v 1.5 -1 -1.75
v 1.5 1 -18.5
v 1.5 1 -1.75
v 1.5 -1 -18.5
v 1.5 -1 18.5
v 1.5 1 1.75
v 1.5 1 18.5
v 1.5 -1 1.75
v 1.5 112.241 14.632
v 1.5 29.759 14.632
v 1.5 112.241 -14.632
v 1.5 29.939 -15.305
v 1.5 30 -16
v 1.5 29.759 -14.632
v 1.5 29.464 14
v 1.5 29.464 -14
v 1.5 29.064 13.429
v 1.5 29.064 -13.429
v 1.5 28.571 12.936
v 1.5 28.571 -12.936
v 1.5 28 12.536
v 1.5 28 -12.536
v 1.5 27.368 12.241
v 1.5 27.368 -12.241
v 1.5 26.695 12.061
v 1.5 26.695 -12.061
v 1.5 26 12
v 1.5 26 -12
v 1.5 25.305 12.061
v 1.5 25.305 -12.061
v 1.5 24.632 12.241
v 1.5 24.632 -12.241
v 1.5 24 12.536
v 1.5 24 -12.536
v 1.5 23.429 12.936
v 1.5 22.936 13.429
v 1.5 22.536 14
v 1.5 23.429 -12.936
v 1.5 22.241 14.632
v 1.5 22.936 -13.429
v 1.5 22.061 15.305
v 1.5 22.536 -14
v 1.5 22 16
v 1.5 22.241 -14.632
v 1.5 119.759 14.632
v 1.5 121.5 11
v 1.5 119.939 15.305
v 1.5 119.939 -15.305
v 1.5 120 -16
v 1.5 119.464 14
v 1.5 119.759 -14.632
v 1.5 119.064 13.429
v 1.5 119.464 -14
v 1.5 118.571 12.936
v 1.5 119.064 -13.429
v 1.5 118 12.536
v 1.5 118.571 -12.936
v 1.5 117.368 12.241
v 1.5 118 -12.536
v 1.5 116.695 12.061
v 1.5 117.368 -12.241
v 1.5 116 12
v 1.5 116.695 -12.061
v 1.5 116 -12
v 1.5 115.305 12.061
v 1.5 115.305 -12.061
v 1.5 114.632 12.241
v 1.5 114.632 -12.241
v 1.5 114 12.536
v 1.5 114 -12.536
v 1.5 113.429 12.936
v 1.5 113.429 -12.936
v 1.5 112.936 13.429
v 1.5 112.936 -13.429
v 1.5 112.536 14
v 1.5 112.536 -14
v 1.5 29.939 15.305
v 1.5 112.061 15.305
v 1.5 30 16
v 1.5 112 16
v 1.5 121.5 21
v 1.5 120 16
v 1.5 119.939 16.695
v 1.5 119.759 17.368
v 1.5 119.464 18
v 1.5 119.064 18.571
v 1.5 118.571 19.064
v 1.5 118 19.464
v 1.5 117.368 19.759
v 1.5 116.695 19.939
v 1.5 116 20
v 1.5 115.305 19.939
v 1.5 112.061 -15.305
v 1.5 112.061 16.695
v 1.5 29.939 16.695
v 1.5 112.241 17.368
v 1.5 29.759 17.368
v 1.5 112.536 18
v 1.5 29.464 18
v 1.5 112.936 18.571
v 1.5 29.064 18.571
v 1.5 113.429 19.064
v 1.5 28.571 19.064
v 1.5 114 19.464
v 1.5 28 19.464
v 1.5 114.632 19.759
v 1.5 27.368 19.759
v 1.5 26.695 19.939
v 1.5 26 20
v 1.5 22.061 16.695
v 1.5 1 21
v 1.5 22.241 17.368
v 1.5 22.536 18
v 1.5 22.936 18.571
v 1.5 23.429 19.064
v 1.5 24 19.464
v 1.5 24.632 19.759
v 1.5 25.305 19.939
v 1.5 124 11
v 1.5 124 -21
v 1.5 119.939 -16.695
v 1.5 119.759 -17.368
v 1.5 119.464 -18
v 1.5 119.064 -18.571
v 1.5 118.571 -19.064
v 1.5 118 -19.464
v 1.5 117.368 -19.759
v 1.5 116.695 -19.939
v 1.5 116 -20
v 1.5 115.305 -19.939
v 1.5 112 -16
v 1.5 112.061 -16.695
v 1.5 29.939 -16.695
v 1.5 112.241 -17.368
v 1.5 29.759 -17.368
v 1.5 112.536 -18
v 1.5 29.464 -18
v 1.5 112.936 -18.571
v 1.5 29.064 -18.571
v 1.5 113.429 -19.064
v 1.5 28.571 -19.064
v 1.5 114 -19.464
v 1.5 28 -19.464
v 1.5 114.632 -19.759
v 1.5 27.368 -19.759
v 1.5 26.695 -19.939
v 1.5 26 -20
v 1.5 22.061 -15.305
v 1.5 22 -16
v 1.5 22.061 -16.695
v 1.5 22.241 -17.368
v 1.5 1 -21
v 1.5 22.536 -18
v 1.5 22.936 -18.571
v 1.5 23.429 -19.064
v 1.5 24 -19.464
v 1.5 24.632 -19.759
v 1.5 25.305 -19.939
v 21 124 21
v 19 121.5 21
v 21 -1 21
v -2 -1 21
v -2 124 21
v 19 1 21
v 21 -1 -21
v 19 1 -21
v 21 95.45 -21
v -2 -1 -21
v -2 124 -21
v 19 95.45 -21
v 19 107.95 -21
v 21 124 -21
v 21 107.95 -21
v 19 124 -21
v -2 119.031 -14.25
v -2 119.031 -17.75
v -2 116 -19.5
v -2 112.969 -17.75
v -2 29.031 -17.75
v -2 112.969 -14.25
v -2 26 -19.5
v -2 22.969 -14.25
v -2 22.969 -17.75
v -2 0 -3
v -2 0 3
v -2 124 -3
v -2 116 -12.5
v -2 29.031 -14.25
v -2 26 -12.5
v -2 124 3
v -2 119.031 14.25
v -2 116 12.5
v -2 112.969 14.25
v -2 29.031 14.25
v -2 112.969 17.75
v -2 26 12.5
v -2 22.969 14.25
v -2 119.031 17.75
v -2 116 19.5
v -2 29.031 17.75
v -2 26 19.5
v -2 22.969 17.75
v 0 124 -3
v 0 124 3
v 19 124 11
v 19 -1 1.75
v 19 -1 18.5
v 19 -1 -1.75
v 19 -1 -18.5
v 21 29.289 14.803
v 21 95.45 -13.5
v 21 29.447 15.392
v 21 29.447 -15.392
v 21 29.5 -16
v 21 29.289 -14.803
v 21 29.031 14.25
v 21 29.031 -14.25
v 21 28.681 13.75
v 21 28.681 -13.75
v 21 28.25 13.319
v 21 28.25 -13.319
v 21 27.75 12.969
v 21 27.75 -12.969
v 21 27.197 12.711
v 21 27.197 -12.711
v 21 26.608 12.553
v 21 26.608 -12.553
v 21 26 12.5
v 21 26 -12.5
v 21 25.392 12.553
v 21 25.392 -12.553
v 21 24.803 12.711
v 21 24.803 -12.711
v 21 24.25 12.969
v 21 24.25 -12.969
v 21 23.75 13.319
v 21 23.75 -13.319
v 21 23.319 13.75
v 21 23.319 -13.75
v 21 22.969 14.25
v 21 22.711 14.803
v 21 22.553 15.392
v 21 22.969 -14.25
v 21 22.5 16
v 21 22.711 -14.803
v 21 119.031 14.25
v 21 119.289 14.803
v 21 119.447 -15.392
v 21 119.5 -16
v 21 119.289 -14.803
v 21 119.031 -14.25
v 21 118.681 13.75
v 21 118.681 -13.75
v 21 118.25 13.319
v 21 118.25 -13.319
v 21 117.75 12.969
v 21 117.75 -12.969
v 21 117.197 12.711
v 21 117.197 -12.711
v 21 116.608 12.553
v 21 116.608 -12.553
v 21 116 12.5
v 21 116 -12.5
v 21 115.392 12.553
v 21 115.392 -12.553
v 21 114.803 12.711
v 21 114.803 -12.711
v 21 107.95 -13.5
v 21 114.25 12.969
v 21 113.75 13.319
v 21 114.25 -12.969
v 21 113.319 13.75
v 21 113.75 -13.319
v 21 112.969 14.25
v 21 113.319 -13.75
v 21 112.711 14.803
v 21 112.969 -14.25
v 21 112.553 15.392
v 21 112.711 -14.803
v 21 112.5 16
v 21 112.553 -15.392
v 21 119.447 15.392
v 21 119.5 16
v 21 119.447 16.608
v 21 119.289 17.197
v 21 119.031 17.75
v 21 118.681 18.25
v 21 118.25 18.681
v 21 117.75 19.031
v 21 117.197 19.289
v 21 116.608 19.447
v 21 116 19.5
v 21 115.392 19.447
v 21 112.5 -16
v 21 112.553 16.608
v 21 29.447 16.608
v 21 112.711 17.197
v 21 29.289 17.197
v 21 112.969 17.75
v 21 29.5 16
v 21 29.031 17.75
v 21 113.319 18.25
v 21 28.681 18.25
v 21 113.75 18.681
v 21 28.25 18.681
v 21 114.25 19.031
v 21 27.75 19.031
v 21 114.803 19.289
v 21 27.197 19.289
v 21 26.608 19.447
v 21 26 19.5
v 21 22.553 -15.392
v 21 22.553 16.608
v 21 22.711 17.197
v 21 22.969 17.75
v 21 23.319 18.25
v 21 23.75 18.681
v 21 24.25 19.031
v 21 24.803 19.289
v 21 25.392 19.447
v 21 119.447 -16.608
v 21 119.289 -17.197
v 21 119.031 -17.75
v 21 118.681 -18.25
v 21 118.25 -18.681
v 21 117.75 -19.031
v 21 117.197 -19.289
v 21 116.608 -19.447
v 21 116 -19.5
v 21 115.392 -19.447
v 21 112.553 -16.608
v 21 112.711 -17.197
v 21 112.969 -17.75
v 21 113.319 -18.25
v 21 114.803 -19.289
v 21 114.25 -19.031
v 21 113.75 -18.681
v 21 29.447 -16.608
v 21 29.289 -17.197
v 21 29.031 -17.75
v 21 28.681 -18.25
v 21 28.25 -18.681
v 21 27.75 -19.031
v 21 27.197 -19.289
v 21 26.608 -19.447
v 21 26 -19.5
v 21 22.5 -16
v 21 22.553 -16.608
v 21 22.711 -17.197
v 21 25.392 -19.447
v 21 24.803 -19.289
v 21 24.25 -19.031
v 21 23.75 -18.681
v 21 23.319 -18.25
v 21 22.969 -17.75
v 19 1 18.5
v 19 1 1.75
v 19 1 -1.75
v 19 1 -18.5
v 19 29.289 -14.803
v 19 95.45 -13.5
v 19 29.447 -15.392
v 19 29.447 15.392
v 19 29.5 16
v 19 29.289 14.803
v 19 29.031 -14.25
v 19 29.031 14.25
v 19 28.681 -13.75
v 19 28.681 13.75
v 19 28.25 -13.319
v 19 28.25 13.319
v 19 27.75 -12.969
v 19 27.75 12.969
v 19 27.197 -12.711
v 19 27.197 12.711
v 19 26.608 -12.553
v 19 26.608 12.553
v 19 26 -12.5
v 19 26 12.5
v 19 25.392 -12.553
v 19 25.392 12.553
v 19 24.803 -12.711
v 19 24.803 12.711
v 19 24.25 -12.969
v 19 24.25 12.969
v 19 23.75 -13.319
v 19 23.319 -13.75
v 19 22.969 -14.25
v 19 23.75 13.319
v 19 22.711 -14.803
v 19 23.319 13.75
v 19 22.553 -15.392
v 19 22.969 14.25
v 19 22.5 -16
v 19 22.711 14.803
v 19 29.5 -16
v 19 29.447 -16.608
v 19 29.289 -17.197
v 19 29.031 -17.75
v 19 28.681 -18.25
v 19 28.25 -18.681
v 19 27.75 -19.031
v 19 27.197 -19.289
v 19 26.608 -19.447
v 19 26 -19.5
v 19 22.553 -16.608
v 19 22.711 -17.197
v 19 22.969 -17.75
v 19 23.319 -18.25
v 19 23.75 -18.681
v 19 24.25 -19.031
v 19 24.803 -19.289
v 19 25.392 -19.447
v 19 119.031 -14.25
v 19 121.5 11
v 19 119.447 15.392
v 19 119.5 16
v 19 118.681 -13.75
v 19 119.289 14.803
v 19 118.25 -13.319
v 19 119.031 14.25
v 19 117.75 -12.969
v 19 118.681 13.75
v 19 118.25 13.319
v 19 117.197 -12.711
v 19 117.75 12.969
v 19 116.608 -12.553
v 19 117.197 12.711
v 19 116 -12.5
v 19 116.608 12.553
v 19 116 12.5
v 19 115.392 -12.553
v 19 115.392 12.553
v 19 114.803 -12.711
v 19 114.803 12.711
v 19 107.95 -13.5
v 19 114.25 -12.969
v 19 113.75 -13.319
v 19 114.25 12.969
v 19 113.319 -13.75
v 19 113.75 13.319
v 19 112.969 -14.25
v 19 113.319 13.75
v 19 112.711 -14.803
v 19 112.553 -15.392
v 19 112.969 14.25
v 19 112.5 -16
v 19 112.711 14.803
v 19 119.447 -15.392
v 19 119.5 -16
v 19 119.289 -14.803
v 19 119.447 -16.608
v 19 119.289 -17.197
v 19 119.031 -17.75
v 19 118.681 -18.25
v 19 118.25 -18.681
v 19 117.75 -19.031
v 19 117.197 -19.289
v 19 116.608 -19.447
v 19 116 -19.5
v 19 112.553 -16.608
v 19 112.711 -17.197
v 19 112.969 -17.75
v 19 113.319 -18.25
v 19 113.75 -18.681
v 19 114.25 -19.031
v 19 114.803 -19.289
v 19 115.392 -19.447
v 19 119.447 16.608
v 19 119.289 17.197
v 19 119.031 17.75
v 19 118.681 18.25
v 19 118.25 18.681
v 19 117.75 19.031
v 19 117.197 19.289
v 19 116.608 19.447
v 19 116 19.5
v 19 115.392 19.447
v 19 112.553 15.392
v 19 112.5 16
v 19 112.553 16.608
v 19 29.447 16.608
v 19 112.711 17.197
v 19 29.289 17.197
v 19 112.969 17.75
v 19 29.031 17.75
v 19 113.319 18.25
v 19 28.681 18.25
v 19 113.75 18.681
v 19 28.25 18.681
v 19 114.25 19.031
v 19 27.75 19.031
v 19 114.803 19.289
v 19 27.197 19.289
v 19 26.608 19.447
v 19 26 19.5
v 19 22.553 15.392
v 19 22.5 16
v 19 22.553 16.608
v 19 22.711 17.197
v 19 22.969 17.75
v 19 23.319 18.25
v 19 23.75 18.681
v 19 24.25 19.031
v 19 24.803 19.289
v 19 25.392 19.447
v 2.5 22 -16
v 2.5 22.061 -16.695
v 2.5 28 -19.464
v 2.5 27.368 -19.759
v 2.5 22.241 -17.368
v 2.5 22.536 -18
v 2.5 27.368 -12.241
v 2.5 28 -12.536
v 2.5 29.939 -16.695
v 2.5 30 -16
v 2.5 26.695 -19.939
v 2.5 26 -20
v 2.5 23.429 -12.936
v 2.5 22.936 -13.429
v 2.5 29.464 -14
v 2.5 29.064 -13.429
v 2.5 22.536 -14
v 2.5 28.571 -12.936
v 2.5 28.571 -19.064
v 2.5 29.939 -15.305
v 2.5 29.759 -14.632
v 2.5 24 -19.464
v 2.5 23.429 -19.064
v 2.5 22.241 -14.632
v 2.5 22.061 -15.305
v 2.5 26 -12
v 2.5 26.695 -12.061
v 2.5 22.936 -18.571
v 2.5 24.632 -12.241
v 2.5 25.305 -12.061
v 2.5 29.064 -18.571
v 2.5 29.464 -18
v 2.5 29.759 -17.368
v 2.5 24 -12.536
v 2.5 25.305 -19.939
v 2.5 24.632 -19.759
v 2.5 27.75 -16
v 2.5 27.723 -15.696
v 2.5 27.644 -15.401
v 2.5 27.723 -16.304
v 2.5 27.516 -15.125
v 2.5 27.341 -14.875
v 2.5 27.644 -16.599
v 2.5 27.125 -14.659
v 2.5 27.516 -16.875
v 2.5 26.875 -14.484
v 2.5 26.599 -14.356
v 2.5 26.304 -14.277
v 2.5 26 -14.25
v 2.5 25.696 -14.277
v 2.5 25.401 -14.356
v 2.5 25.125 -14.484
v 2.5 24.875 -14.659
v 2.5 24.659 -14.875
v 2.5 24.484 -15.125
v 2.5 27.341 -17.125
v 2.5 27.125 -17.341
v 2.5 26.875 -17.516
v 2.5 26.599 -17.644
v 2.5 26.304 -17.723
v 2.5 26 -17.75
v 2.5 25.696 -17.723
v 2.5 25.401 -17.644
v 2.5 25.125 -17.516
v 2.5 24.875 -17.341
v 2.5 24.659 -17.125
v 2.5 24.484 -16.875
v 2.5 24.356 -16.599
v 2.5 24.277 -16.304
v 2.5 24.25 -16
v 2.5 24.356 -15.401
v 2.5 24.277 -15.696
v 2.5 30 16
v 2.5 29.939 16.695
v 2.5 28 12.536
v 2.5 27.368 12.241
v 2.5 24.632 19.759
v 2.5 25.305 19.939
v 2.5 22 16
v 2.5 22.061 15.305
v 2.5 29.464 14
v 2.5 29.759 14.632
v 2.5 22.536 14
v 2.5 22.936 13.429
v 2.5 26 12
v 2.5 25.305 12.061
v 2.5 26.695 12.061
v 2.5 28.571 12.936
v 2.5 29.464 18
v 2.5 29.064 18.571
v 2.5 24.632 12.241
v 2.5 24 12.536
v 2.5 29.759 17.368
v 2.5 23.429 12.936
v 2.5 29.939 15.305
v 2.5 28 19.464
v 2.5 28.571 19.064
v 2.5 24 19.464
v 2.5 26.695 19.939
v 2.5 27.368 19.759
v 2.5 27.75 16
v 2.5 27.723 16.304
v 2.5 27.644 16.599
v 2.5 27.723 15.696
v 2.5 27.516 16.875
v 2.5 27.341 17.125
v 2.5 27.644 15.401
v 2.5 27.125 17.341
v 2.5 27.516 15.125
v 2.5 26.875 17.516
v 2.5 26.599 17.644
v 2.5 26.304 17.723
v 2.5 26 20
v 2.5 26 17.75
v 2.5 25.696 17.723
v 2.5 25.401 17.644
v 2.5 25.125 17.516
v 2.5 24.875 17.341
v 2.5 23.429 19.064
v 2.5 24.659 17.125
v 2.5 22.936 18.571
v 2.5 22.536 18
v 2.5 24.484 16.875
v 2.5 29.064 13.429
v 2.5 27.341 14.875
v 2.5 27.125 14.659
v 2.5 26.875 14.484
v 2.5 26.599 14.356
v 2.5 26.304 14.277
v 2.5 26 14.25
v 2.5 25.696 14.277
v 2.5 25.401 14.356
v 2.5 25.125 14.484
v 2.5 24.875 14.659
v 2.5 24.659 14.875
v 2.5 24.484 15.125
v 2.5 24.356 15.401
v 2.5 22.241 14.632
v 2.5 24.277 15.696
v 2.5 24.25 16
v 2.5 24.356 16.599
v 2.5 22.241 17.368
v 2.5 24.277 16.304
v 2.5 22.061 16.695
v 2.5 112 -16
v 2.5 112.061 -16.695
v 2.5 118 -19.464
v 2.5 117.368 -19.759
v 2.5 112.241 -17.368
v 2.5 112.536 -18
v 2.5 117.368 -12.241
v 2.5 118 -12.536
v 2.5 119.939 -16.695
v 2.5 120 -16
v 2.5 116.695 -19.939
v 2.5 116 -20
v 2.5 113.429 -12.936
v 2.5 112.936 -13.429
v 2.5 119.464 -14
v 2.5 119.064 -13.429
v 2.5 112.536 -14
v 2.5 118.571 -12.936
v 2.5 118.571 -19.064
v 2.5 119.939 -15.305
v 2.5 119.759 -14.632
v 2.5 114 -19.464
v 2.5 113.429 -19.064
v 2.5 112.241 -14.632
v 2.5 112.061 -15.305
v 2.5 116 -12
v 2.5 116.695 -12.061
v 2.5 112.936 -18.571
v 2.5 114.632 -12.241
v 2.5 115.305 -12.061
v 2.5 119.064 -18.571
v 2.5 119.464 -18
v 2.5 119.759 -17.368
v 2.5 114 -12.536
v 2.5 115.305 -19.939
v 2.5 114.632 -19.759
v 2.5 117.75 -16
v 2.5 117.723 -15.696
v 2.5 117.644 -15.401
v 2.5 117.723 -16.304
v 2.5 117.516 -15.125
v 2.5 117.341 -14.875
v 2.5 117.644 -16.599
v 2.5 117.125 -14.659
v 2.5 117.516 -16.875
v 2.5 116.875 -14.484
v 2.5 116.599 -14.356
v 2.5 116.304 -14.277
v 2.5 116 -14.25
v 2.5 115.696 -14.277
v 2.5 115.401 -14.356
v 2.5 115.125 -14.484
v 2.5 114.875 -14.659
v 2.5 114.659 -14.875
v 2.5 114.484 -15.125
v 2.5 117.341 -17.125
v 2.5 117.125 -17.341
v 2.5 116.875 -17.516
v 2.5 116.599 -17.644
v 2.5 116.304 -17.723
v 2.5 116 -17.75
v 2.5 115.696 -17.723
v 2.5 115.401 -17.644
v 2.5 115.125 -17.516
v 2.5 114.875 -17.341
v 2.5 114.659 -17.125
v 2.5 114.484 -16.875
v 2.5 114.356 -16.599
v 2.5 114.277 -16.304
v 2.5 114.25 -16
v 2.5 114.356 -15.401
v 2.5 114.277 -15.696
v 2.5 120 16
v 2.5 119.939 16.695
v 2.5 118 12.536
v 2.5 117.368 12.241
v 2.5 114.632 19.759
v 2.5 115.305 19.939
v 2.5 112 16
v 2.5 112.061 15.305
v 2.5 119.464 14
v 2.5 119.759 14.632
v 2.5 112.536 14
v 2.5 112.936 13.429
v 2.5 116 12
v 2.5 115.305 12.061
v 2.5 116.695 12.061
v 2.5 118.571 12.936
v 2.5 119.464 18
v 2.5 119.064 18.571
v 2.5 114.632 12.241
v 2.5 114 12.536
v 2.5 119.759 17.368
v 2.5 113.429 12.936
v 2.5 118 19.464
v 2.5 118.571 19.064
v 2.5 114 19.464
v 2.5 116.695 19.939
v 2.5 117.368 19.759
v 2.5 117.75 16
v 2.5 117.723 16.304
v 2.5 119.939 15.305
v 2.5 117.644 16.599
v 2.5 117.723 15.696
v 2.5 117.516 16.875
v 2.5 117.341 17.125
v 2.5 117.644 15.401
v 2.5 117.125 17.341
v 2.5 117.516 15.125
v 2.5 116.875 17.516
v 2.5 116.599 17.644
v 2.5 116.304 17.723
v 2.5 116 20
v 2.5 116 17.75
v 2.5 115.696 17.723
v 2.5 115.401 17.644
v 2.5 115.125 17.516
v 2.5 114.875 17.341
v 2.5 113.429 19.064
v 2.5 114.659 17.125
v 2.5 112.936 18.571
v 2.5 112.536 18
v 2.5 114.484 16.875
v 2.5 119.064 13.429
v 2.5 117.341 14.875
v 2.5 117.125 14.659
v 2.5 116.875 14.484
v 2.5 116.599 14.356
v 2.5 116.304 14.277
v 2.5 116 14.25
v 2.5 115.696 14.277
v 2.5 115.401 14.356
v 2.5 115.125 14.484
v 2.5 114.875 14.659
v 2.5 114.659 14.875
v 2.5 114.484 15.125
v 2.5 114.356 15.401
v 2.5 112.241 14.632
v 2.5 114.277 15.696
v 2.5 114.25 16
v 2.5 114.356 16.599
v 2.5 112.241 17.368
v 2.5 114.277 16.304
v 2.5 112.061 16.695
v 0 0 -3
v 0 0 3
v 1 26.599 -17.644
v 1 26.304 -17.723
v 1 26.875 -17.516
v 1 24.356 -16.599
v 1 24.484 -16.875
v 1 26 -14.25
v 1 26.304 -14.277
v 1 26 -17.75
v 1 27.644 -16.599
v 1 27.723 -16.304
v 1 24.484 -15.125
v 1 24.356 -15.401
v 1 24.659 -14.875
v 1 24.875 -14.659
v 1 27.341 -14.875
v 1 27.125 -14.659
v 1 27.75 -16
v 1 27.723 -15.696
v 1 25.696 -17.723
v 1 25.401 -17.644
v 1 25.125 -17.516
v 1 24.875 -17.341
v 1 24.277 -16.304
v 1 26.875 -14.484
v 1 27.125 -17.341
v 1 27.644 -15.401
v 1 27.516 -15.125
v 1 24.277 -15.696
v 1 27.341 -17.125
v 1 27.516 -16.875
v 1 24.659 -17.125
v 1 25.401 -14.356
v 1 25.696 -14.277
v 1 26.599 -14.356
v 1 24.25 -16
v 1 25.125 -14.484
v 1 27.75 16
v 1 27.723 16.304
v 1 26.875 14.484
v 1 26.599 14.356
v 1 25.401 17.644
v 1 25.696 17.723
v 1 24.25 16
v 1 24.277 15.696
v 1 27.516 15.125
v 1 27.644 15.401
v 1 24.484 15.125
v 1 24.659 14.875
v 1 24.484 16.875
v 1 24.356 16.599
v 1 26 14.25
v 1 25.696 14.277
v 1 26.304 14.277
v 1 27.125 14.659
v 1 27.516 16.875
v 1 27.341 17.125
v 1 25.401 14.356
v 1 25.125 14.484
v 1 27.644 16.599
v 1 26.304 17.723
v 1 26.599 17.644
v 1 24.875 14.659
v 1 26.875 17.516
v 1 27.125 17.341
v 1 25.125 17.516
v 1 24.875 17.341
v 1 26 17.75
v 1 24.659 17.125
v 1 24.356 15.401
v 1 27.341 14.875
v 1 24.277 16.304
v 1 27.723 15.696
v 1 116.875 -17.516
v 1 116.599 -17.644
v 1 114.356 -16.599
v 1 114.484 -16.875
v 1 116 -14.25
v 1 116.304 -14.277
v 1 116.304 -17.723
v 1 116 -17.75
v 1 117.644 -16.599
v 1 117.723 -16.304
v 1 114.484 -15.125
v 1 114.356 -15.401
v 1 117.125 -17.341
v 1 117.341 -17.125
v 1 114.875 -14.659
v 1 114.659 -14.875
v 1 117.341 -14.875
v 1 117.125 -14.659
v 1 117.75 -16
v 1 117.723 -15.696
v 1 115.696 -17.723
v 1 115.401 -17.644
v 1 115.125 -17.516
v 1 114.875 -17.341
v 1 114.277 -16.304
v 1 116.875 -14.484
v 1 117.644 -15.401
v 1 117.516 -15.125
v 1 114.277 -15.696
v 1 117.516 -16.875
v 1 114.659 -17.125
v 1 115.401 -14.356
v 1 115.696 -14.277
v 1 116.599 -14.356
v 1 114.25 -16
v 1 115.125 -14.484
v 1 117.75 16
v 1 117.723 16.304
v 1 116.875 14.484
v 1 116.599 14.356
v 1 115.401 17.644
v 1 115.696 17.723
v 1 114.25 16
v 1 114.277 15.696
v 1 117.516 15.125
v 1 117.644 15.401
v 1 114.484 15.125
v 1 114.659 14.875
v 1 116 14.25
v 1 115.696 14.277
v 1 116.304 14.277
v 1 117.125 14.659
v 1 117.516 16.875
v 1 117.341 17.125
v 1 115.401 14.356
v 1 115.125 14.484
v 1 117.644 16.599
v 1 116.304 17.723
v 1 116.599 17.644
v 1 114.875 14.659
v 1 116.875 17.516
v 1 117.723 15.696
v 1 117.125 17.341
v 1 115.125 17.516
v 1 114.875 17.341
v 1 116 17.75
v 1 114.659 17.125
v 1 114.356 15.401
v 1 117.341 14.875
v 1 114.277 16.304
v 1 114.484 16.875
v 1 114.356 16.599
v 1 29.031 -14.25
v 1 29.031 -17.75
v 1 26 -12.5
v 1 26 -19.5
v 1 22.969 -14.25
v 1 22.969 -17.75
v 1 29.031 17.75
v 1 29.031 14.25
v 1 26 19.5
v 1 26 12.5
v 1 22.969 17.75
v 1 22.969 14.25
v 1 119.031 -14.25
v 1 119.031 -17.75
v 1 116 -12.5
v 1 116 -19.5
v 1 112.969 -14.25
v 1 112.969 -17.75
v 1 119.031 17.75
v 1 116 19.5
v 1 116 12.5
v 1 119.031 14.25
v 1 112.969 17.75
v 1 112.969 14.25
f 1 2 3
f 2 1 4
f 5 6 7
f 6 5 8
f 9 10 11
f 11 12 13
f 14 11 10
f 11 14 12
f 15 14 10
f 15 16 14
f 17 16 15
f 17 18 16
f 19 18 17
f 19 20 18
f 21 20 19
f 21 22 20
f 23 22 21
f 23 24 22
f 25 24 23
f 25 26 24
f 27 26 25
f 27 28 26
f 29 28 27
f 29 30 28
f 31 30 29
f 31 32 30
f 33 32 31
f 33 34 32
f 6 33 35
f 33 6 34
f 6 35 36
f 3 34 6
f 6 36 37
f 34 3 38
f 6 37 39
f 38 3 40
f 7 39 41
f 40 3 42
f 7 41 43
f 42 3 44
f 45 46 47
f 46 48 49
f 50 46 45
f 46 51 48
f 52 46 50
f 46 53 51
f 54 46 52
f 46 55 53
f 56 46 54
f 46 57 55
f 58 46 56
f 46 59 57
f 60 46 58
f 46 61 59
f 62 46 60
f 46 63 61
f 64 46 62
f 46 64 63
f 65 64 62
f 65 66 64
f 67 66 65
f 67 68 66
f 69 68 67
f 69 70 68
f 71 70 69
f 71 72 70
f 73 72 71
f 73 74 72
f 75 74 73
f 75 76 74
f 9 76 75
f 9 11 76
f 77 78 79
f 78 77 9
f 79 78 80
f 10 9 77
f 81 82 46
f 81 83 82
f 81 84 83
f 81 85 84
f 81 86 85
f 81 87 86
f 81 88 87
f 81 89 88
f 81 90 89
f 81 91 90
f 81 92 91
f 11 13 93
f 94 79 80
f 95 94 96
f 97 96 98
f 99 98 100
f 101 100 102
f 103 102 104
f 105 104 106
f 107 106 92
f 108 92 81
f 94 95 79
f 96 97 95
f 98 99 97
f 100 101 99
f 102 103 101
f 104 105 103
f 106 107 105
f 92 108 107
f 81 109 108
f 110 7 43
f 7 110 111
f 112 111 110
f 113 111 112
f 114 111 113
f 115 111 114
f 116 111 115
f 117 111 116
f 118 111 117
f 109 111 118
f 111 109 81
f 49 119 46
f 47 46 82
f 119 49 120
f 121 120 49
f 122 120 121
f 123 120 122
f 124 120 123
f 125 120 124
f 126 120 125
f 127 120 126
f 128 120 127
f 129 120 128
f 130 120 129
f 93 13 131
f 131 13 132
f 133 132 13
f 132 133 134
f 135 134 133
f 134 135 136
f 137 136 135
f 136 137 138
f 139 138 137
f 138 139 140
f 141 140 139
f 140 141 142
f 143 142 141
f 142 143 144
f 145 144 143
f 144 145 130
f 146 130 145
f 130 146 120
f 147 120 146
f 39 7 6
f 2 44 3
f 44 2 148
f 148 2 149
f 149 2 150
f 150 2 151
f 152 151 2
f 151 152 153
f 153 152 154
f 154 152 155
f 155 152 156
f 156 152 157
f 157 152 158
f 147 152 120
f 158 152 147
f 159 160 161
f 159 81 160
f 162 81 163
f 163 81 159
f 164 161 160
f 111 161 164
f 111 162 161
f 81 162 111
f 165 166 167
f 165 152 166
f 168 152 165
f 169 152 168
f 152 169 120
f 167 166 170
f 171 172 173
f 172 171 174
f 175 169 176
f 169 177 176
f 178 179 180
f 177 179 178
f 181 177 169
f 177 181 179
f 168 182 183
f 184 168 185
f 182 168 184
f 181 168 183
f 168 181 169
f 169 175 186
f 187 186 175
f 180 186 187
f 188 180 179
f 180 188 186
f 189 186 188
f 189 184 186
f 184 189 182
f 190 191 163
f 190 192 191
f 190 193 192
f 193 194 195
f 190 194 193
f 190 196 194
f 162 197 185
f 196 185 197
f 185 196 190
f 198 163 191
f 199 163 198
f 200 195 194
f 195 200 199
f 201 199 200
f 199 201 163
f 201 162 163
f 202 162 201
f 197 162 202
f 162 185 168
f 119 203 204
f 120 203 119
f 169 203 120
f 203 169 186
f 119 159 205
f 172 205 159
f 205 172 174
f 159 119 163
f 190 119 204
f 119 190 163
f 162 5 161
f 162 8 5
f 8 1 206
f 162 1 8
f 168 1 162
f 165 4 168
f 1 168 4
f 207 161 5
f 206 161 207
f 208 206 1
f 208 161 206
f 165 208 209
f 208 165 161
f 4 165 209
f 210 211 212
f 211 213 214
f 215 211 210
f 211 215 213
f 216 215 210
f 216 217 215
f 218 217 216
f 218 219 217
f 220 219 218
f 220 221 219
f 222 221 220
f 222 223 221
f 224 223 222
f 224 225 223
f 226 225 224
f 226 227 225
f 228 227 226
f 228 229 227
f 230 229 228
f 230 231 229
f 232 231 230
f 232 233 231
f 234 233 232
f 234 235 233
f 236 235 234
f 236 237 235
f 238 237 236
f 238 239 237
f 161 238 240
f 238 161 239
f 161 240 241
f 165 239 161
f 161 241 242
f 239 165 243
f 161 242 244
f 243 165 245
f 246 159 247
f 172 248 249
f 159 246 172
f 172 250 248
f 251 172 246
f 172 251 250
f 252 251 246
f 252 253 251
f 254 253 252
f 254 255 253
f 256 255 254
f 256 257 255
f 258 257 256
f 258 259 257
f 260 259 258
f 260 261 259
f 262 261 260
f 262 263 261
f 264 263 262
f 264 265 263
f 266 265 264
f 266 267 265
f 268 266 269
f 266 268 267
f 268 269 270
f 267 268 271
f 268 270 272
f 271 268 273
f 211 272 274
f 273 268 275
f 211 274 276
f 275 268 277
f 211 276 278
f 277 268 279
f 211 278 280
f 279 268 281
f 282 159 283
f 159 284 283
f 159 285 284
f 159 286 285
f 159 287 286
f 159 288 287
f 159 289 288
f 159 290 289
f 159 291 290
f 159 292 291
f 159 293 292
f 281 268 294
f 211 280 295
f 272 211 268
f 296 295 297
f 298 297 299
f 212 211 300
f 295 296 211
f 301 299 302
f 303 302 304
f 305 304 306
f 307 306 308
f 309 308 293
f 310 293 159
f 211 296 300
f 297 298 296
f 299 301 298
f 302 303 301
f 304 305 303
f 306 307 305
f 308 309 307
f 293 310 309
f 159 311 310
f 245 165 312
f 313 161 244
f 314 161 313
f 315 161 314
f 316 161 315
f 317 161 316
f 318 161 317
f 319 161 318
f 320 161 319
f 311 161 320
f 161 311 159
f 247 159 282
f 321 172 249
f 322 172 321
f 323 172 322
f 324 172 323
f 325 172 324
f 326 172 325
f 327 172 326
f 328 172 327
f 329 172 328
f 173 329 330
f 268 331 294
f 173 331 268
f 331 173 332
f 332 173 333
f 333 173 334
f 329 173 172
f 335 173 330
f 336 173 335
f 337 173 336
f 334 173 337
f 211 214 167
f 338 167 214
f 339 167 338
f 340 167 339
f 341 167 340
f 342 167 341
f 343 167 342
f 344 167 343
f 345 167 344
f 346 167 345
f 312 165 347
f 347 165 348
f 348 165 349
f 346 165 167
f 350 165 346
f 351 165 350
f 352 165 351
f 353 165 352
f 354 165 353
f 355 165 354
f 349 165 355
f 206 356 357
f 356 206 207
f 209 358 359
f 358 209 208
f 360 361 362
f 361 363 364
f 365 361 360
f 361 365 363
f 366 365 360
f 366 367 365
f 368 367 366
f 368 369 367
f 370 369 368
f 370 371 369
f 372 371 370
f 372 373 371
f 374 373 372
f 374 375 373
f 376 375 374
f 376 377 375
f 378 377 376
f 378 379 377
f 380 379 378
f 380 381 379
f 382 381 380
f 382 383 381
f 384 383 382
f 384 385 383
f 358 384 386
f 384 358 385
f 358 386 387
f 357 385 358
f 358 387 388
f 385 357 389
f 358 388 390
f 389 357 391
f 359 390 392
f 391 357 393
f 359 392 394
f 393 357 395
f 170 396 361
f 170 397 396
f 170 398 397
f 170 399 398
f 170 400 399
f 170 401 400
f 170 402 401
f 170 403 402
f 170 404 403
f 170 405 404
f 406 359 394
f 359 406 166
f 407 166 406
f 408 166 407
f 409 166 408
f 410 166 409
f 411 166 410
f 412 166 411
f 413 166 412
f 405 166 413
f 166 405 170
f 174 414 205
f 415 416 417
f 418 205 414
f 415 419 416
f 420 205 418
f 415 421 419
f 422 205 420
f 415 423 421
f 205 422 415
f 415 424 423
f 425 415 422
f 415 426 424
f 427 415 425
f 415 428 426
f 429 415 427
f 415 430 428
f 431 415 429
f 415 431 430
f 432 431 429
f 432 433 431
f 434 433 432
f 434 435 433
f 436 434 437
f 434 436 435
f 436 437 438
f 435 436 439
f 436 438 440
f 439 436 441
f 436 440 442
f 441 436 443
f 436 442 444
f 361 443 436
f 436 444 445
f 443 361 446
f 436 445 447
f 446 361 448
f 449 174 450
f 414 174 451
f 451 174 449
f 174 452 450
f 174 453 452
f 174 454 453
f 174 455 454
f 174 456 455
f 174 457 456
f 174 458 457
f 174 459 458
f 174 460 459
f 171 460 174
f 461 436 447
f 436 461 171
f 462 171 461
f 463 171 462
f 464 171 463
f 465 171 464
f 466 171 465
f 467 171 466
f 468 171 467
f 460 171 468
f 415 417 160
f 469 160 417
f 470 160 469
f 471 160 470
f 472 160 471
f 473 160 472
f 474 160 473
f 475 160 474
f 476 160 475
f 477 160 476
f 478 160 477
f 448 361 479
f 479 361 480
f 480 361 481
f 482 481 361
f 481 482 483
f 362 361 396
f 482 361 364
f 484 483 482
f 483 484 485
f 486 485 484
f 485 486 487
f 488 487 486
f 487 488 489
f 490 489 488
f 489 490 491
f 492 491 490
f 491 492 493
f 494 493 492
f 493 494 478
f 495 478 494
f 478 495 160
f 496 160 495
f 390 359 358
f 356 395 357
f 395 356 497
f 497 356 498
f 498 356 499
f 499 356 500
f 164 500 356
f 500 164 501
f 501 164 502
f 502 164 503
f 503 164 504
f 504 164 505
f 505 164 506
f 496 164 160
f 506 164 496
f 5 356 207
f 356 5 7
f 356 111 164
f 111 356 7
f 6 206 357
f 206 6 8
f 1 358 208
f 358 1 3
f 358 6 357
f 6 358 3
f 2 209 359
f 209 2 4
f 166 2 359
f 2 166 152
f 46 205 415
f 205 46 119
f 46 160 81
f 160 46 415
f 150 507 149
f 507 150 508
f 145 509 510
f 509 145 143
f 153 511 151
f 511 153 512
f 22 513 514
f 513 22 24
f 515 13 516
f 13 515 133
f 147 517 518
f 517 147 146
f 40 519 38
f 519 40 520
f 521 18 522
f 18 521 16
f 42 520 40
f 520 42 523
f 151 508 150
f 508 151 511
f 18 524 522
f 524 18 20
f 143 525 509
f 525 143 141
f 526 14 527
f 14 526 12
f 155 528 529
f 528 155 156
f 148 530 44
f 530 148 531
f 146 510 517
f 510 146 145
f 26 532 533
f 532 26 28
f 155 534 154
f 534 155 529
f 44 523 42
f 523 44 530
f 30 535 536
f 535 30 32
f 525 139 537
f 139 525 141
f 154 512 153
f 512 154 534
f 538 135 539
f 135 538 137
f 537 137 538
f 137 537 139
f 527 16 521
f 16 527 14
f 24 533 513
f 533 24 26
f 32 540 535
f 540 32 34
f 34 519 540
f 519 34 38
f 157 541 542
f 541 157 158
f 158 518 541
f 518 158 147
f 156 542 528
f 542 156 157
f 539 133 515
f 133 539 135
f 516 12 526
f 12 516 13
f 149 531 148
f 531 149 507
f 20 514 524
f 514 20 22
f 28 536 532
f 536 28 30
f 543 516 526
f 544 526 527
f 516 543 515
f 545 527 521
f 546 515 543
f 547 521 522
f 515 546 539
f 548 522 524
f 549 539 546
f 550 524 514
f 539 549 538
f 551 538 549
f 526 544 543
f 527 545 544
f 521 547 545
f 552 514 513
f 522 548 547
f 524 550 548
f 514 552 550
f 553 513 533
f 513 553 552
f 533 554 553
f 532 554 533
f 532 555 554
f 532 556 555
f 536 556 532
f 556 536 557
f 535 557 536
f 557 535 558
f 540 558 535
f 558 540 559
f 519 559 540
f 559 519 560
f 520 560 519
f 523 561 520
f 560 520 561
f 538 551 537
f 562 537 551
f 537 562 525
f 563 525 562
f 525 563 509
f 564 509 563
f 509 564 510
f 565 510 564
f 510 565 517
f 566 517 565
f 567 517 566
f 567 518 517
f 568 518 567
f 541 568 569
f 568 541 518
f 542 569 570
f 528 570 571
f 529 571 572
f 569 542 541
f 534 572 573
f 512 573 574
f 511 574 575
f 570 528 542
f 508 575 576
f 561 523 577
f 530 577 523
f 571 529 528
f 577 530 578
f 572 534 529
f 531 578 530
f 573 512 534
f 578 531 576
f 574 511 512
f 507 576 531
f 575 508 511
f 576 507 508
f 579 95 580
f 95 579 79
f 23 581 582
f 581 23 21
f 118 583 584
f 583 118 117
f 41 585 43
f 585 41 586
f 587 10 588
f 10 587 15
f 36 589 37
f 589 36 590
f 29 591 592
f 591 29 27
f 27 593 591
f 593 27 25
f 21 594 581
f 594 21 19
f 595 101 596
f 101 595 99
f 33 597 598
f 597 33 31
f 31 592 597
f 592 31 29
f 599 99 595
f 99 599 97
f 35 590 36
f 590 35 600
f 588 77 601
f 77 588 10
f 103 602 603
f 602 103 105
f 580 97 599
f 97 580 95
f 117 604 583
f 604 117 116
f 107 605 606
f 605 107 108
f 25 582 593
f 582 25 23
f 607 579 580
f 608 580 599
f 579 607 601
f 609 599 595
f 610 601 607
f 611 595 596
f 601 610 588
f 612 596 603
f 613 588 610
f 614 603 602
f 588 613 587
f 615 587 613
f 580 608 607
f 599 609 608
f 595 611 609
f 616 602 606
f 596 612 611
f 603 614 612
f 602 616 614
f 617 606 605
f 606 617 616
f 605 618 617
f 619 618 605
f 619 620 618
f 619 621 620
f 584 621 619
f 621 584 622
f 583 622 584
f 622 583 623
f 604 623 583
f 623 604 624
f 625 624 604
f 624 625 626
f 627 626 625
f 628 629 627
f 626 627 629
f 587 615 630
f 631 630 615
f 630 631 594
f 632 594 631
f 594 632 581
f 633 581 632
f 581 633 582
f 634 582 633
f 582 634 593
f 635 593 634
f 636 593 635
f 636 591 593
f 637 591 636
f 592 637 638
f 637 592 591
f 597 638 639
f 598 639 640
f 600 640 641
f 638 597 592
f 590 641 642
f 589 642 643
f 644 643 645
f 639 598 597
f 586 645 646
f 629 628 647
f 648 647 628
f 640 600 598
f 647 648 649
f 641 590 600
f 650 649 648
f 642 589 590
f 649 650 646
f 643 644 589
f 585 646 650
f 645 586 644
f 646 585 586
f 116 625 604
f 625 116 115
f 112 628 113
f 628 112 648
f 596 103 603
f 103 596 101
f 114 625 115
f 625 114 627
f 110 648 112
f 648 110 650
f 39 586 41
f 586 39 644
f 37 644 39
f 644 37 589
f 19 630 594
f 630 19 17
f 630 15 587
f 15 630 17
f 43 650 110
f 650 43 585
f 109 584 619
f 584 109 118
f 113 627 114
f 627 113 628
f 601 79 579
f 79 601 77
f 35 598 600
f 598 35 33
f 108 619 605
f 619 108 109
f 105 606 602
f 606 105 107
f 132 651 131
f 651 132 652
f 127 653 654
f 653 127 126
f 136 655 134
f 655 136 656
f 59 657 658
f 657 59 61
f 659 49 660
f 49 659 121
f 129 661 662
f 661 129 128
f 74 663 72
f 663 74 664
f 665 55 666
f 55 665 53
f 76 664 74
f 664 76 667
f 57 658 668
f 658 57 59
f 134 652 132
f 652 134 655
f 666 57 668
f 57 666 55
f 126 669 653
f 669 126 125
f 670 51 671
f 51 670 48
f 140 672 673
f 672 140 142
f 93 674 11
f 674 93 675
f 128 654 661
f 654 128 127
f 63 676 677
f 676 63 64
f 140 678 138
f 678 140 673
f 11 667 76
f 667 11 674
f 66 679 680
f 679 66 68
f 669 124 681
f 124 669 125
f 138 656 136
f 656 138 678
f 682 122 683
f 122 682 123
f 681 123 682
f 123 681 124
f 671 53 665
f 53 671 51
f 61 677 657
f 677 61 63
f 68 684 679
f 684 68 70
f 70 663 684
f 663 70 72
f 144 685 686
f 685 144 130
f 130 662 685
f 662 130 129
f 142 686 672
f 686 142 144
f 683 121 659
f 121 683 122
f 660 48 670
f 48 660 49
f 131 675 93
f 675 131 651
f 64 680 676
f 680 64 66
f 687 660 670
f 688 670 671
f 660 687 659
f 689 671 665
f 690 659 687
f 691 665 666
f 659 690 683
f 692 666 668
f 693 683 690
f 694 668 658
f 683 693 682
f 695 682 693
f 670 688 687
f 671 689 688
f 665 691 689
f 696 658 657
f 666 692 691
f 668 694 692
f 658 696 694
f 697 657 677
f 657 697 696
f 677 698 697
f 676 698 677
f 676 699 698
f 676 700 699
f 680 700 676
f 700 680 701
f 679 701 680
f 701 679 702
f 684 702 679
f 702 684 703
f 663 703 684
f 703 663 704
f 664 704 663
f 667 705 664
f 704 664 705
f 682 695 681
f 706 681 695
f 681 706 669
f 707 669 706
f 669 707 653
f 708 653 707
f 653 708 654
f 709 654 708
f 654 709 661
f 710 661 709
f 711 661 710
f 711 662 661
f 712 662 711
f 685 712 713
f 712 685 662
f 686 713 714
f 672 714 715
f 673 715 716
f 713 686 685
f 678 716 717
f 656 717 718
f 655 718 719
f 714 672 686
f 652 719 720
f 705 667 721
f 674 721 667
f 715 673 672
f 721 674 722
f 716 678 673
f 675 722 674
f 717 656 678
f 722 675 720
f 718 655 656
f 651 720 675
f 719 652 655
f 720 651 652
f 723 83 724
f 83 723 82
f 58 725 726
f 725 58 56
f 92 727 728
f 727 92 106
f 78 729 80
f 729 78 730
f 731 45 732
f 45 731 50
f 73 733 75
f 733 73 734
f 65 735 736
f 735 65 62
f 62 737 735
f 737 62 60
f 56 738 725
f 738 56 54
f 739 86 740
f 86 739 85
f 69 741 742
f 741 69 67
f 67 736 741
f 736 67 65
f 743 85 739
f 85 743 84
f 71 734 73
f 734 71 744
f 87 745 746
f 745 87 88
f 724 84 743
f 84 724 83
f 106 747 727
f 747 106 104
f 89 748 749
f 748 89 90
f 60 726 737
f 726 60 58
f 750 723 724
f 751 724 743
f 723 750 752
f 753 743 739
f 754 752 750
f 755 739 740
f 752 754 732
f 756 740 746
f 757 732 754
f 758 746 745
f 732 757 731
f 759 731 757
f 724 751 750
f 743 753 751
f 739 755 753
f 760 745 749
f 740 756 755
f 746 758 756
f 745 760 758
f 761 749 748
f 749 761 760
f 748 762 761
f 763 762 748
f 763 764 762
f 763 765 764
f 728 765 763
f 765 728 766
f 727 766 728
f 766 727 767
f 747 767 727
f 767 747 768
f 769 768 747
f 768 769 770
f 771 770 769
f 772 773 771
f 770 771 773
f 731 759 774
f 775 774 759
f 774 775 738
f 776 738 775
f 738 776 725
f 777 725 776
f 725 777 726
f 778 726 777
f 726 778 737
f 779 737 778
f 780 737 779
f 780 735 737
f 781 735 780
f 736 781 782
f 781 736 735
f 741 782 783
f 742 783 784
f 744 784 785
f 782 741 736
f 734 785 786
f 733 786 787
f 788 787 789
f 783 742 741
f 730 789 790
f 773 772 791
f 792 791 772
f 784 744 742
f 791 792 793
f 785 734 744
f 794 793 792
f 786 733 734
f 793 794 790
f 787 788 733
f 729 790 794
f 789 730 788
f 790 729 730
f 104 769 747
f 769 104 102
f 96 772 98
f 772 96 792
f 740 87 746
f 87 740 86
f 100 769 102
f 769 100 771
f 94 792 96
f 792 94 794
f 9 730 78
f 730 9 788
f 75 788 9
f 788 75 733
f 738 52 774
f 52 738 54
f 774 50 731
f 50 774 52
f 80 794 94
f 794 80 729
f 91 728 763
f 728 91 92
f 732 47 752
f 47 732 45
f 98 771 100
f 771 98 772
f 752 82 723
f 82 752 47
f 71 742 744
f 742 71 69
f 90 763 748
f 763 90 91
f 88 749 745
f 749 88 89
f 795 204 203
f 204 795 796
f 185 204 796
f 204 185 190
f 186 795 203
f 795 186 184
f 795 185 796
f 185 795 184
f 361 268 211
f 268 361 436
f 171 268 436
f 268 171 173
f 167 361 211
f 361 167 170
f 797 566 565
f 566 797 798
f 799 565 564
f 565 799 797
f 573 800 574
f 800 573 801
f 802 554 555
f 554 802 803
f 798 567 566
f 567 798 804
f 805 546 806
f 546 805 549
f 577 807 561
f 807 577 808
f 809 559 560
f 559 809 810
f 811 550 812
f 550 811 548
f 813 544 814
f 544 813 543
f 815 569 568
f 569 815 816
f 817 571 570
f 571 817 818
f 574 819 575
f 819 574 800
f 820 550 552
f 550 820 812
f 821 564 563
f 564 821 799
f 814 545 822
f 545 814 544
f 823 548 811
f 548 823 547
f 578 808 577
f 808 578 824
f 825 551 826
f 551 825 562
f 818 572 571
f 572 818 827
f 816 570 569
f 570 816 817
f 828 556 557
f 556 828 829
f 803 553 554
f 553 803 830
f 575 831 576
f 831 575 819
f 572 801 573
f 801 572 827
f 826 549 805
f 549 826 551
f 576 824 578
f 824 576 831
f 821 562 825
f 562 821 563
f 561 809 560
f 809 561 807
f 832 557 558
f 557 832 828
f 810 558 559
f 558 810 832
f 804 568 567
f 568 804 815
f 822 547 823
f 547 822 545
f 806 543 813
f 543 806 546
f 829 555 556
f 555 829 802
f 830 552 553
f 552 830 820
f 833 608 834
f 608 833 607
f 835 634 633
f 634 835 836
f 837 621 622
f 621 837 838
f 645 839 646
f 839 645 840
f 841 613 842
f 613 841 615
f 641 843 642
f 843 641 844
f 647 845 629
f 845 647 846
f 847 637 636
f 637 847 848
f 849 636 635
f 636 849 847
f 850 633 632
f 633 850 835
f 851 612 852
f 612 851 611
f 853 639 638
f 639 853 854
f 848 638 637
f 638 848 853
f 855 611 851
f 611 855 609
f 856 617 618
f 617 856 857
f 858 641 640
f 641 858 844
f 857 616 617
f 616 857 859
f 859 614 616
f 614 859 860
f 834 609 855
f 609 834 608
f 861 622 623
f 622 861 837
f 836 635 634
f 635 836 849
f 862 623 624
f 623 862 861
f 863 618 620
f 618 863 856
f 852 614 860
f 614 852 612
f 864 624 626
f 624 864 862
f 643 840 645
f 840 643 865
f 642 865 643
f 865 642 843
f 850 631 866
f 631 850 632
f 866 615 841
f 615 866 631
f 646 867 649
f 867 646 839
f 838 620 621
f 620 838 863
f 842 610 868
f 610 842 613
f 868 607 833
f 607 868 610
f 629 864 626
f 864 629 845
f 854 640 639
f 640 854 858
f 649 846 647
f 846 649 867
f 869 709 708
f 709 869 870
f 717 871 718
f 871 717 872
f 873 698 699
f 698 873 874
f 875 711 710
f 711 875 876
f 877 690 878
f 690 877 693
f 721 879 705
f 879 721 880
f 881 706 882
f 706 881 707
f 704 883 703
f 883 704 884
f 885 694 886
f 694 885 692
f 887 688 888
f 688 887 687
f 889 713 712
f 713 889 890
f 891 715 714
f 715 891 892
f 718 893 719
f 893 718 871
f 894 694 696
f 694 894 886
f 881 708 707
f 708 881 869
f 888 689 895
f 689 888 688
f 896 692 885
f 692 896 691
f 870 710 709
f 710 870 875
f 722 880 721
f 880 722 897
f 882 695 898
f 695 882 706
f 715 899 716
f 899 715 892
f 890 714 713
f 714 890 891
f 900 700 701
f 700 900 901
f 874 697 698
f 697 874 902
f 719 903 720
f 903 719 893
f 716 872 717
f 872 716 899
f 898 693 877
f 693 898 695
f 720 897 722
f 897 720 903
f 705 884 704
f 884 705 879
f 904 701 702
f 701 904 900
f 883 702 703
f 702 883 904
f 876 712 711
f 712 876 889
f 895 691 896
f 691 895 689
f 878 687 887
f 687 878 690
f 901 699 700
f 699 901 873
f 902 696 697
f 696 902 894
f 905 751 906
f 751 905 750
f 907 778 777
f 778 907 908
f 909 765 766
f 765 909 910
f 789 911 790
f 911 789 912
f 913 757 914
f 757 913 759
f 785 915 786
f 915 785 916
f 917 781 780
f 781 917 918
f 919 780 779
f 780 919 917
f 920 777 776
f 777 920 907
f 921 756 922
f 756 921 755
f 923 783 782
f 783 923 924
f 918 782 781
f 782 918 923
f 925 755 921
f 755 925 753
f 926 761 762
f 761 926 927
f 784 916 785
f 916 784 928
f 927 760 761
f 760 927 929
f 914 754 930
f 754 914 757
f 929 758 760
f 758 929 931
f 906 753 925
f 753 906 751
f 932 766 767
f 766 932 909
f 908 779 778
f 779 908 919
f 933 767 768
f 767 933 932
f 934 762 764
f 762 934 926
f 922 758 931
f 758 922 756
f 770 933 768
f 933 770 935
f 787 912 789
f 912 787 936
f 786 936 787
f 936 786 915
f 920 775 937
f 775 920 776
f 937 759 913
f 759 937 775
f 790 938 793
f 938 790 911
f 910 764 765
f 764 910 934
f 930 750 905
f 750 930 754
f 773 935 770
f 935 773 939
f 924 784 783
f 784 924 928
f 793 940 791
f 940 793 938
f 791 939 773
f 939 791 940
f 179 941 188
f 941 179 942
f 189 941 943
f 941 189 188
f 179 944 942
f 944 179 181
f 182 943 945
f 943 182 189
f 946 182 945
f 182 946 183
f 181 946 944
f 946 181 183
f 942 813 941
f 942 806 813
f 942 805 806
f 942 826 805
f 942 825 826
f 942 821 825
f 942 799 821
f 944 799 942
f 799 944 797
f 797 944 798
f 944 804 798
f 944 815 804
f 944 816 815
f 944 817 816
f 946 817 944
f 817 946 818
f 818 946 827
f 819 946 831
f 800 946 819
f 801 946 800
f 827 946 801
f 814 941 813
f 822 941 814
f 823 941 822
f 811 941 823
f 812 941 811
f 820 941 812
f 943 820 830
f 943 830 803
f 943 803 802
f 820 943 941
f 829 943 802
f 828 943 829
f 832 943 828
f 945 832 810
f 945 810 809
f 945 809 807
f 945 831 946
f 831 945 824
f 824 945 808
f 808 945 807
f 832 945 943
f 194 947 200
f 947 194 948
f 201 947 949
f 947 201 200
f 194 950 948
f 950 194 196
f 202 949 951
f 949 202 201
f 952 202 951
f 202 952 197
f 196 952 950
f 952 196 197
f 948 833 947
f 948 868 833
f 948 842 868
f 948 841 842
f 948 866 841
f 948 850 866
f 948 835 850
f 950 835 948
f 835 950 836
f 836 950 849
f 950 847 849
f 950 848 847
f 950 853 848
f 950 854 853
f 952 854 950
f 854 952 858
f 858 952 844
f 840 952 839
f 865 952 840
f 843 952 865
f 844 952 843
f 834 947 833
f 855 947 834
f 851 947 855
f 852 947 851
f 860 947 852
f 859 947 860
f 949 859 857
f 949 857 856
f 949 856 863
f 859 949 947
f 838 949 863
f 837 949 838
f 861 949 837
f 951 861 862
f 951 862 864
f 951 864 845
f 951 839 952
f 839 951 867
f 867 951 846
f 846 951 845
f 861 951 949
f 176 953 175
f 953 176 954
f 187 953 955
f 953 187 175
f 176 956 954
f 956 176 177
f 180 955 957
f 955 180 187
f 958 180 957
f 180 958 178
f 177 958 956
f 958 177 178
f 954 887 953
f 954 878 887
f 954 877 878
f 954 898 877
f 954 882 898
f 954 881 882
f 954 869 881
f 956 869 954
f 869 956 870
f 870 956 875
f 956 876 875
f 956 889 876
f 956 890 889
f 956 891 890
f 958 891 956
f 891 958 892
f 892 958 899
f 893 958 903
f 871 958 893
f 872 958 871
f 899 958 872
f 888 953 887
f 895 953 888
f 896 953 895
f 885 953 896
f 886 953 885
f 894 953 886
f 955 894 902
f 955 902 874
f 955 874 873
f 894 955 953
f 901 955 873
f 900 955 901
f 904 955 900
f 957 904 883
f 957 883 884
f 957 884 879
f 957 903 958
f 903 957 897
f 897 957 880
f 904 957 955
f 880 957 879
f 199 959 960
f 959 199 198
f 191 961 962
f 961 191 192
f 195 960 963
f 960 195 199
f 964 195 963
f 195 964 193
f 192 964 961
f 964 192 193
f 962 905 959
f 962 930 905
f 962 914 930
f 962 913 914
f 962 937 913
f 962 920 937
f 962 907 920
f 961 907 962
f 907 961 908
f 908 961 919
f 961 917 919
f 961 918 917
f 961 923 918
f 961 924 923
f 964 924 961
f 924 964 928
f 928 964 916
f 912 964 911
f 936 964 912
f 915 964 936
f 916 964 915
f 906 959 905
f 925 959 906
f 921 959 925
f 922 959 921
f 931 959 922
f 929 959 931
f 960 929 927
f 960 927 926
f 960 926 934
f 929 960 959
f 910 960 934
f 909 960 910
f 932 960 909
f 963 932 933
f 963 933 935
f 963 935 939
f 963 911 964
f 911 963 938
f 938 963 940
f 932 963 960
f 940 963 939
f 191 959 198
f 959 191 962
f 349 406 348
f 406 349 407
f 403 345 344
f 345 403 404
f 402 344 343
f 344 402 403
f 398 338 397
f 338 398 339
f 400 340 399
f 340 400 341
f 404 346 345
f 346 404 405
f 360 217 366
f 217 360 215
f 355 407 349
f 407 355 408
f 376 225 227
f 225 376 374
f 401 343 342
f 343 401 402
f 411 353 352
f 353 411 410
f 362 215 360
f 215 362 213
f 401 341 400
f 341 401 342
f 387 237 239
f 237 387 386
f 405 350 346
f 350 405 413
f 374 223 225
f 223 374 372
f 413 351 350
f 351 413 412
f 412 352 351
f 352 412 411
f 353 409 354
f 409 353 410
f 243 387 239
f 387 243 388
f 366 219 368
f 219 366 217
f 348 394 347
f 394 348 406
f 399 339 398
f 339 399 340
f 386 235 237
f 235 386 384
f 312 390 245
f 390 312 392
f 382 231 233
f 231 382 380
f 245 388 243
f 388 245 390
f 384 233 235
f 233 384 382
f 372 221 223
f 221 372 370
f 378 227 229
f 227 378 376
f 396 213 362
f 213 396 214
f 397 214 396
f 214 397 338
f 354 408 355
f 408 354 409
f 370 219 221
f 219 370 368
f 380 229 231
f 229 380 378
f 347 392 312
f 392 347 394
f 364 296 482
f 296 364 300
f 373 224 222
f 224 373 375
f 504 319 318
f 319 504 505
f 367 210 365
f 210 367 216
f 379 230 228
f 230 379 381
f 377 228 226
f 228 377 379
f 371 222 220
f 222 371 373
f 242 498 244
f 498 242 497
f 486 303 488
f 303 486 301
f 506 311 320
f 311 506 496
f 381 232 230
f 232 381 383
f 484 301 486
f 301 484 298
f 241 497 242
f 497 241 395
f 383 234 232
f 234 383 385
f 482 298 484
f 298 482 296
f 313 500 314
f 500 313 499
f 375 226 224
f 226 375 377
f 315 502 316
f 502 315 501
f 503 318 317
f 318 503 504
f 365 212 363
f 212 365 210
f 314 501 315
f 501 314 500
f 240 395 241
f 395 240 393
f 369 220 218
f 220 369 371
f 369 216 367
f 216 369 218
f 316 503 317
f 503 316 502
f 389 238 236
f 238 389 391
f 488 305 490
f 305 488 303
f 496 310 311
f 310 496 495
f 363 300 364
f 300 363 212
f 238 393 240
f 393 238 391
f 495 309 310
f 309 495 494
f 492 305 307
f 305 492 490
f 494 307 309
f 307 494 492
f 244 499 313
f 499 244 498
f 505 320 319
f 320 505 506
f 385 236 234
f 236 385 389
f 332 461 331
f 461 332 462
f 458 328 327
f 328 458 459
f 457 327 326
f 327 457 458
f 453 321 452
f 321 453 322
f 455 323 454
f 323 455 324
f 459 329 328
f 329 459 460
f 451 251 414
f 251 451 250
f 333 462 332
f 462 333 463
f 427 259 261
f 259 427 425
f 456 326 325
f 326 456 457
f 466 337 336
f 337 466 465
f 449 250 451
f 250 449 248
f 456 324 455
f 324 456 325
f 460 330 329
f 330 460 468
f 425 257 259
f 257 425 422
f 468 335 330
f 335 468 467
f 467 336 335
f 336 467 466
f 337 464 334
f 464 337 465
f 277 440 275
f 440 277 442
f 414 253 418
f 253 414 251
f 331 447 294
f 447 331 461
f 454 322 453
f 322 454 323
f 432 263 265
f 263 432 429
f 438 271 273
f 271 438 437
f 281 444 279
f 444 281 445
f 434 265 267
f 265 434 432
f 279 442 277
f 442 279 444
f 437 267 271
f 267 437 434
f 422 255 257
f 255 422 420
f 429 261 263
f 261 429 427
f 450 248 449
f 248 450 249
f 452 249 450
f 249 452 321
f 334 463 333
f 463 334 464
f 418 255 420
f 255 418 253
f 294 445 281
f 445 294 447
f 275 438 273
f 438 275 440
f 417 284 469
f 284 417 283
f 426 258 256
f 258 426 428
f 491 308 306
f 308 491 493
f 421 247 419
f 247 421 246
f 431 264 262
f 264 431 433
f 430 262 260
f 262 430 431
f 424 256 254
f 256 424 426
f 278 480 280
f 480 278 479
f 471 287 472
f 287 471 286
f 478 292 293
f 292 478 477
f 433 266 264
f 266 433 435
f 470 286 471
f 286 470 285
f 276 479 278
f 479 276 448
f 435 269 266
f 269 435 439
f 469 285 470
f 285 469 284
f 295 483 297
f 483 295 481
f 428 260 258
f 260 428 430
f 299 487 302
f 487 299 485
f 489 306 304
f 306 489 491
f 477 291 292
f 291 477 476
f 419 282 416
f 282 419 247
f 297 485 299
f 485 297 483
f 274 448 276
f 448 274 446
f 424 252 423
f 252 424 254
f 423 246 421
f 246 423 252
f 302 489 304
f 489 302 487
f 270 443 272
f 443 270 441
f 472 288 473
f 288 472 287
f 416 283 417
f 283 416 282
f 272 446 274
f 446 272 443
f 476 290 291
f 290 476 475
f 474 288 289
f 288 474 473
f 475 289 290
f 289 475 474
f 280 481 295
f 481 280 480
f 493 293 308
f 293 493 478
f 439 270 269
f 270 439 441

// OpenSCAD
/*
 * Klinge Enclosure
 * Copyright (c) 2025 Lone Dynamics Corporation. All rights reserved.
 *
 * required hardware:
 *  - 4 x M3 x 6mm bolts
 *  - 4 x M3 nuts
 *
 */

$fn = 36;

klinge();

module klinge() {
    
    difference() {
        union() {
            
            // sidewalls
            translate([-0.25,61.5,0]) cube([3.5,125,42], center=true);
            translate([20,61.5,0]) cube([2,125,42], center=true);          
            
            // front panel
            translate([10,0,19.75]) cube([20,2,2.5], center=true);
            translate([10,0,0]) cube([20,2,3.5], center=true);            
            translate([10,0,-19.75]) cube([20,2,2.5], center=true);

            // back panel
            translate([10,125-2.25,16]) cube([20,2.5,10], center=true); 
    
        // mount pads
        rotate([0,90,0]) translate([16,25+1,0.5]) cylinder(d=8, h=4, center=true);
        rotate([0,90,0]) translate([-16,25+1,0.5]) cylinder(d=8, h=4, center=true);
        rotate([0,90,0]) translate([16,(25+90)+1,0.5]) cylinder(d=8, h=4, center=true);
        rotate([0,90,0]) translate([-16,(25+90)+1,0.5]) cylinder(d=8, h=4, center=true);

            
        }
        
        // guide rail
        translate([-1,65,0]) cube([2,130,6], center=true);

        // jtag cutout
        translate([30,100.7+1,-18.5]) cube([23,12.5,10], center=true);

        // bolt holes
        rotate([0,90,0]) translate([16,25+1,0]) cylinder(d=3.5, h=500, center=true);
        rotate([0,90,0]) translate([-16,25+1,0]) cylinder(d=3.5, h=500, center=true);
        rotate([0,90,0]) translate([16,(25+90)+1,0]) cylinder(d=3.5, h=500, center=true);
        rotate([0,90,0]) translate([-16,(25+90)+1,0]) cylinder(d=3.5, h=500, center=true);

        // nut holes
        rotate([0,90,0]) translate([16,25+1,-1]) cylinder(d=7, h=4, $fn=6, center=true);
        rotate([0,90,0]) translate([-16,25+1,-1]) cylinder(d=7, h=4, $fn=6, center=true);
        rotate([0,90,0]) translate([16,(25+90)+1,-1]) cylinder(d=7, h=4, $fn=6, center=true);
        rotate([0,90,0]) translate([-16,(25+90)+1,-1]) cylinder(d=7, h=4, $fn=6, center=true);

        // tool holes
        rotate([0,90,0]) translate([16,25+1,30]) cylinder(d=7, h=50, center=true);
        rotate([0,90,0]) translate([-16,25+1,30]) cylinder(d=7, h=50, center=true);
        rotate([0,90,0]) translate([16,(25+90)+1,30]) cylinder(d=7, h=50, center=true);
        rotate([0,90,0]) translate([-16,(25+90)+1,30]) cylinder(d=7, h=50, center=true);

        
    }
}
